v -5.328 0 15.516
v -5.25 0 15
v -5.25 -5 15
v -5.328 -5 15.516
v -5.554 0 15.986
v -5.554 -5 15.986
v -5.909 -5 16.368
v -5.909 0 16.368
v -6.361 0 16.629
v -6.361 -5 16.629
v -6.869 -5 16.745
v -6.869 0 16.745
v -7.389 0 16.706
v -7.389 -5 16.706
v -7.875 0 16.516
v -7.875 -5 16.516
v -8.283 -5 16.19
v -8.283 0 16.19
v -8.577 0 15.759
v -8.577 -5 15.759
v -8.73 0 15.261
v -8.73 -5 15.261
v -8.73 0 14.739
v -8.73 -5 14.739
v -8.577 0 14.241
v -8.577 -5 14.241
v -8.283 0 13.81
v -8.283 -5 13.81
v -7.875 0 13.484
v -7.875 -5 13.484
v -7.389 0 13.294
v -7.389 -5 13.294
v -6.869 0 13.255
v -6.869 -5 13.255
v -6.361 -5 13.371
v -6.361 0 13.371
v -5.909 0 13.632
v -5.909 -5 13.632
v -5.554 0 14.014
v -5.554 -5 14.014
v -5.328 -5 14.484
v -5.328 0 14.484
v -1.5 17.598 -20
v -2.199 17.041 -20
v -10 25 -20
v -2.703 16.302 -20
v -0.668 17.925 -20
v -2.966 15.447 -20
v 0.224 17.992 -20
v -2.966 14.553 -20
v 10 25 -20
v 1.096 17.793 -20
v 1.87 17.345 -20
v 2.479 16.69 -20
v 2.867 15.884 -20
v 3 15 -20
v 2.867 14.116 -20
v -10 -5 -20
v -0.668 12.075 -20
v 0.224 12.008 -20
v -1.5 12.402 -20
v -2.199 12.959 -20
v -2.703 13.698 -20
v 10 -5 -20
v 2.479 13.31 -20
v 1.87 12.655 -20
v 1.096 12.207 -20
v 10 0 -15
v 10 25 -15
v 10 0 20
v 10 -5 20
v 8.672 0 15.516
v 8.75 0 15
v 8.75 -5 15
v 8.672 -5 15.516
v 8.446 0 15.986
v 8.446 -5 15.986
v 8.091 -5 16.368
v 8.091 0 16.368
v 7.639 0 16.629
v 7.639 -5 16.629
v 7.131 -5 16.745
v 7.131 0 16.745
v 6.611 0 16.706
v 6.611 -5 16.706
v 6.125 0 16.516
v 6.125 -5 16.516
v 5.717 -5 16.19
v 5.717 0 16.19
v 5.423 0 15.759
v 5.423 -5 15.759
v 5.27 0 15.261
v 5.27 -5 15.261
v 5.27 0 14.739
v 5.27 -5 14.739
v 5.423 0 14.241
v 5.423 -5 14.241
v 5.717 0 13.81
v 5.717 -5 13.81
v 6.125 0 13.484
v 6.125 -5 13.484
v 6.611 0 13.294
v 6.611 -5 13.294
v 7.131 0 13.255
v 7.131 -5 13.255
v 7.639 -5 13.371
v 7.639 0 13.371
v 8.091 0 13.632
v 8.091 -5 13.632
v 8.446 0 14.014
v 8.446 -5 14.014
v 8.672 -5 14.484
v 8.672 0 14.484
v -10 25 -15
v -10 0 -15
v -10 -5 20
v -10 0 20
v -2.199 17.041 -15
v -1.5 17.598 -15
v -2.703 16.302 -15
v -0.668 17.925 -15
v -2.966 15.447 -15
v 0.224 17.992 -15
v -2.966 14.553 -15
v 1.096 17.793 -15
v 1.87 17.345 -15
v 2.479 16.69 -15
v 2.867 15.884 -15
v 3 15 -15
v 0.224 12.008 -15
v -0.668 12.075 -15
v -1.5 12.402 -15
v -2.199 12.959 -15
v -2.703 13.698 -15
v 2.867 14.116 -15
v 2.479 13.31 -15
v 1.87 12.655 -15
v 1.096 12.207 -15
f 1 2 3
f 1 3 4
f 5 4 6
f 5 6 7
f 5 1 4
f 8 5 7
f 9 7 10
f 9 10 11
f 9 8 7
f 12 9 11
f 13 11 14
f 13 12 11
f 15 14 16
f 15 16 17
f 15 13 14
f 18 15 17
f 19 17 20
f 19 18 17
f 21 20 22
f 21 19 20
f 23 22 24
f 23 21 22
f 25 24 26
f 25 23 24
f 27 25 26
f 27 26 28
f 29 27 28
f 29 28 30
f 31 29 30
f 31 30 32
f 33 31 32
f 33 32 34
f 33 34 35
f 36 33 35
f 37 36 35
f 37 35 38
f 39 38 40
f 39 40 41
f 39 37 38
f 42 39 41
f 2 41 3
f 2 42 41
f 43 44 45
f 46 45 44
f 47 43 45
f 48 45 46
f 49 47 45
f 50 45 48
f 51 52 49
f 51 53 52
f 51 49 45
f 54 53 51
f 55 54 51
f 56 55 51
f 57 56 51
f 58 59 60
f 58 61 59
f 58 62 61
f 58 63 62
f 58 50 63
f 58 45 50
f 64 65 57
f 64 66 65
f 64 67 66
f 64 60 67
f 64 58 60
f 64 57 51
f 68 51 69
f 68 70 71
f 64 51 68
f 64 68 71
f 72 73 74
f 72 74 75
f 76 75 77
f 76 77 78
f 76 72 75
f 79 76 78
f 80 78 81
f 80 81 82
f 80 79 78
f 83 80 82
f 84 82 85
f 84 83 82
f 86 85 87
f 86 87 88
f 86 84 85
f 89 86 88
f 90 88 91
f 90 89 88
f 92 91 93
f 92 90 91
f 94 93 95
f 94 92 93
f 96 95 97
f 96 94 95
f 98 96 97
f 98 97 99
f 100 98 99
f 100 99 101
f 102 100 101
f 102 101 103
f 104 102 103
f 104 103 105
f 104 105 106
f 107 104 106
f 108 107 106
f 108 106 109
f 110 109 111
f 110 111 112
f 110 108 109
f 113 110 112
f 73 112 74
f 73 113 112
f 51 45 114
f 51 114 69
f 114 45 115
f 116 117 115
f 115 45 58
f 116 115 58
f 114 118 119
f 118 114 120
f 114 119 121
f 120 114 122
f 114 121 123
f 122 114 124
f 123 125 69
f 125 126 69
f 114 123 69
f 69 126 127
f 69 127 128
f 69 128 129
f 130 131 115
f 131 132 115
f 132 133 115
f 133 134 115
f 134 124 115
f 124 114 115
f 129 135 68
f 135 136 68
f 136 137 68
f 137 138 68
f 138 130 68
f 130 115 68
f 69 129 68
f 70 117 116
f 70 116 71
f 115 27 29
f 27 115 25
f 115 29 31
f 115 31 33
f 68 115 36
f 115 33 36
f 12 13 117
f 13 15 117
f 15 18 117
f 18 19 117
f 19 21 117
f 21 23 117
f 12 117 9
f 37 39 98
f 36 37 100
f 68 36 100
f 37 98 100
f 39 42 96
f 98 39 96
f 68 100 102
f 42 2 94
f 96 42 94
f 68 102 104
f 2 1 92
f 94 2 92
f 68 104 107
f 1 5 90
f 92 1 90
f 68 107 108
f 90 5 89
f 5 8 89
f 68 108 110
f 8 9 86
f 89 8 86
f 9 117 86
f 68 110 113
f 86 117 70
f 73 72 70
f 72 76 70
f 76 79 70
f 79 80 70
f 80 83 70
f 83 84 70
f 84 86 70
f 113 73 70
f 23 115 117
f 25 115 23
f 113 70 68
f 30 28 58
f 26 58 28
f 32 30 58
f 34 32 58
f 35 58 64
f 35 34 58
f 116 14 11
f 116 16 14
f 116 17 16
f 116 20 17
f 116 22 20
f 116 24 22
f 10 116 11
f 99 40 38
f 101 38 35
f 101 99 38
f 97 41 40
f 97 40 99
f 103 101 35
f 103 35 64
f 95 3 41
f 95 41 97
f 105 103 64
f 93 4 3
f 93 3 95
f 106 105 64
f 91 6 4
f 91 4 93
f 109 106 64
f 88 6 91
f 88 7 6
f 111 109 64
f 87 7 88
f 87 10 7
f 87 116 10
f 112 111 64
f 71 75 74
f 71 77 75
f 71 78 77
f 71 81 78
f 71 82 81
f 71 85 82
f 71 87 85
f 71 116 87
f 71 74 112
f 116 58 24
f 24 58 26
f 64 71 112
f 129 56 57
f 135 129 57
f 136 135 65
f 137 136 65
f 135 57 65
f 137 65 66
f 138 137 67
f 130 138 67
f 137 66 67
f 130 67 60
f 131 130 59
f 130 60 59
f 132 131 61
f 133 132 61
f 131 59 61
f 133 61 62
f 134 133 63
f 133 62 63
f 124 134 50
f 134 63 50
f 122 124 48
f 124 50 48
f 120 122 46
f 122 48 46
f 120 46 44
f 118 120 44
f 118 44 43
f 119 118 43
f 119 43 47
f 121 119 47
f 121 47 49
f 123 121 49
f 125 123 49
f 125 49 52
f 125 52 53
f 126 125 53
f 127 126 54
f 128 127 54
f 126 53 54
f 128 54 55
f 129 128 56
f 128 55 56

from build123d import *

# Parameters (mm, degrees)
F0_W     = 20
F0_H     = 40
F0_R     = 1.75
F1_DEPTH = 5
F2_W     = 20
F2_H     = 30
F2_R     = 3
F3_DEPTH = 5


with BuildPart() as f1:
    # F0 (on Front) → F1 (new body)
    with BuildSketch(Plane.XZ):
        Rectangle(F0_W, F0_H)
        with Locations((-7, 15)):
            Circle(F0_R, mode=Mode.SUBTRACT)
        with Locations((7, 15)):
            Circle(F0_R, mode=Mode.SUBTRACT)
    extrude(amount=F1_DEPTH)

    # F2 (on face) → F3 (join)
    with BuildSketch(Plane(origin=(0, 0, -20), x_dir=(1, 0, 0), z_dir=(0, 0, -1))):
        with Locations((0, -10)):
            Rectangle(F2_W, F2_H)
        with Locations((0, -15)):
            Circle(F2_R, mode=Mode.SUBTRACT)
    extrude(amount=-F3_DEPTH)


solid = f1.part
